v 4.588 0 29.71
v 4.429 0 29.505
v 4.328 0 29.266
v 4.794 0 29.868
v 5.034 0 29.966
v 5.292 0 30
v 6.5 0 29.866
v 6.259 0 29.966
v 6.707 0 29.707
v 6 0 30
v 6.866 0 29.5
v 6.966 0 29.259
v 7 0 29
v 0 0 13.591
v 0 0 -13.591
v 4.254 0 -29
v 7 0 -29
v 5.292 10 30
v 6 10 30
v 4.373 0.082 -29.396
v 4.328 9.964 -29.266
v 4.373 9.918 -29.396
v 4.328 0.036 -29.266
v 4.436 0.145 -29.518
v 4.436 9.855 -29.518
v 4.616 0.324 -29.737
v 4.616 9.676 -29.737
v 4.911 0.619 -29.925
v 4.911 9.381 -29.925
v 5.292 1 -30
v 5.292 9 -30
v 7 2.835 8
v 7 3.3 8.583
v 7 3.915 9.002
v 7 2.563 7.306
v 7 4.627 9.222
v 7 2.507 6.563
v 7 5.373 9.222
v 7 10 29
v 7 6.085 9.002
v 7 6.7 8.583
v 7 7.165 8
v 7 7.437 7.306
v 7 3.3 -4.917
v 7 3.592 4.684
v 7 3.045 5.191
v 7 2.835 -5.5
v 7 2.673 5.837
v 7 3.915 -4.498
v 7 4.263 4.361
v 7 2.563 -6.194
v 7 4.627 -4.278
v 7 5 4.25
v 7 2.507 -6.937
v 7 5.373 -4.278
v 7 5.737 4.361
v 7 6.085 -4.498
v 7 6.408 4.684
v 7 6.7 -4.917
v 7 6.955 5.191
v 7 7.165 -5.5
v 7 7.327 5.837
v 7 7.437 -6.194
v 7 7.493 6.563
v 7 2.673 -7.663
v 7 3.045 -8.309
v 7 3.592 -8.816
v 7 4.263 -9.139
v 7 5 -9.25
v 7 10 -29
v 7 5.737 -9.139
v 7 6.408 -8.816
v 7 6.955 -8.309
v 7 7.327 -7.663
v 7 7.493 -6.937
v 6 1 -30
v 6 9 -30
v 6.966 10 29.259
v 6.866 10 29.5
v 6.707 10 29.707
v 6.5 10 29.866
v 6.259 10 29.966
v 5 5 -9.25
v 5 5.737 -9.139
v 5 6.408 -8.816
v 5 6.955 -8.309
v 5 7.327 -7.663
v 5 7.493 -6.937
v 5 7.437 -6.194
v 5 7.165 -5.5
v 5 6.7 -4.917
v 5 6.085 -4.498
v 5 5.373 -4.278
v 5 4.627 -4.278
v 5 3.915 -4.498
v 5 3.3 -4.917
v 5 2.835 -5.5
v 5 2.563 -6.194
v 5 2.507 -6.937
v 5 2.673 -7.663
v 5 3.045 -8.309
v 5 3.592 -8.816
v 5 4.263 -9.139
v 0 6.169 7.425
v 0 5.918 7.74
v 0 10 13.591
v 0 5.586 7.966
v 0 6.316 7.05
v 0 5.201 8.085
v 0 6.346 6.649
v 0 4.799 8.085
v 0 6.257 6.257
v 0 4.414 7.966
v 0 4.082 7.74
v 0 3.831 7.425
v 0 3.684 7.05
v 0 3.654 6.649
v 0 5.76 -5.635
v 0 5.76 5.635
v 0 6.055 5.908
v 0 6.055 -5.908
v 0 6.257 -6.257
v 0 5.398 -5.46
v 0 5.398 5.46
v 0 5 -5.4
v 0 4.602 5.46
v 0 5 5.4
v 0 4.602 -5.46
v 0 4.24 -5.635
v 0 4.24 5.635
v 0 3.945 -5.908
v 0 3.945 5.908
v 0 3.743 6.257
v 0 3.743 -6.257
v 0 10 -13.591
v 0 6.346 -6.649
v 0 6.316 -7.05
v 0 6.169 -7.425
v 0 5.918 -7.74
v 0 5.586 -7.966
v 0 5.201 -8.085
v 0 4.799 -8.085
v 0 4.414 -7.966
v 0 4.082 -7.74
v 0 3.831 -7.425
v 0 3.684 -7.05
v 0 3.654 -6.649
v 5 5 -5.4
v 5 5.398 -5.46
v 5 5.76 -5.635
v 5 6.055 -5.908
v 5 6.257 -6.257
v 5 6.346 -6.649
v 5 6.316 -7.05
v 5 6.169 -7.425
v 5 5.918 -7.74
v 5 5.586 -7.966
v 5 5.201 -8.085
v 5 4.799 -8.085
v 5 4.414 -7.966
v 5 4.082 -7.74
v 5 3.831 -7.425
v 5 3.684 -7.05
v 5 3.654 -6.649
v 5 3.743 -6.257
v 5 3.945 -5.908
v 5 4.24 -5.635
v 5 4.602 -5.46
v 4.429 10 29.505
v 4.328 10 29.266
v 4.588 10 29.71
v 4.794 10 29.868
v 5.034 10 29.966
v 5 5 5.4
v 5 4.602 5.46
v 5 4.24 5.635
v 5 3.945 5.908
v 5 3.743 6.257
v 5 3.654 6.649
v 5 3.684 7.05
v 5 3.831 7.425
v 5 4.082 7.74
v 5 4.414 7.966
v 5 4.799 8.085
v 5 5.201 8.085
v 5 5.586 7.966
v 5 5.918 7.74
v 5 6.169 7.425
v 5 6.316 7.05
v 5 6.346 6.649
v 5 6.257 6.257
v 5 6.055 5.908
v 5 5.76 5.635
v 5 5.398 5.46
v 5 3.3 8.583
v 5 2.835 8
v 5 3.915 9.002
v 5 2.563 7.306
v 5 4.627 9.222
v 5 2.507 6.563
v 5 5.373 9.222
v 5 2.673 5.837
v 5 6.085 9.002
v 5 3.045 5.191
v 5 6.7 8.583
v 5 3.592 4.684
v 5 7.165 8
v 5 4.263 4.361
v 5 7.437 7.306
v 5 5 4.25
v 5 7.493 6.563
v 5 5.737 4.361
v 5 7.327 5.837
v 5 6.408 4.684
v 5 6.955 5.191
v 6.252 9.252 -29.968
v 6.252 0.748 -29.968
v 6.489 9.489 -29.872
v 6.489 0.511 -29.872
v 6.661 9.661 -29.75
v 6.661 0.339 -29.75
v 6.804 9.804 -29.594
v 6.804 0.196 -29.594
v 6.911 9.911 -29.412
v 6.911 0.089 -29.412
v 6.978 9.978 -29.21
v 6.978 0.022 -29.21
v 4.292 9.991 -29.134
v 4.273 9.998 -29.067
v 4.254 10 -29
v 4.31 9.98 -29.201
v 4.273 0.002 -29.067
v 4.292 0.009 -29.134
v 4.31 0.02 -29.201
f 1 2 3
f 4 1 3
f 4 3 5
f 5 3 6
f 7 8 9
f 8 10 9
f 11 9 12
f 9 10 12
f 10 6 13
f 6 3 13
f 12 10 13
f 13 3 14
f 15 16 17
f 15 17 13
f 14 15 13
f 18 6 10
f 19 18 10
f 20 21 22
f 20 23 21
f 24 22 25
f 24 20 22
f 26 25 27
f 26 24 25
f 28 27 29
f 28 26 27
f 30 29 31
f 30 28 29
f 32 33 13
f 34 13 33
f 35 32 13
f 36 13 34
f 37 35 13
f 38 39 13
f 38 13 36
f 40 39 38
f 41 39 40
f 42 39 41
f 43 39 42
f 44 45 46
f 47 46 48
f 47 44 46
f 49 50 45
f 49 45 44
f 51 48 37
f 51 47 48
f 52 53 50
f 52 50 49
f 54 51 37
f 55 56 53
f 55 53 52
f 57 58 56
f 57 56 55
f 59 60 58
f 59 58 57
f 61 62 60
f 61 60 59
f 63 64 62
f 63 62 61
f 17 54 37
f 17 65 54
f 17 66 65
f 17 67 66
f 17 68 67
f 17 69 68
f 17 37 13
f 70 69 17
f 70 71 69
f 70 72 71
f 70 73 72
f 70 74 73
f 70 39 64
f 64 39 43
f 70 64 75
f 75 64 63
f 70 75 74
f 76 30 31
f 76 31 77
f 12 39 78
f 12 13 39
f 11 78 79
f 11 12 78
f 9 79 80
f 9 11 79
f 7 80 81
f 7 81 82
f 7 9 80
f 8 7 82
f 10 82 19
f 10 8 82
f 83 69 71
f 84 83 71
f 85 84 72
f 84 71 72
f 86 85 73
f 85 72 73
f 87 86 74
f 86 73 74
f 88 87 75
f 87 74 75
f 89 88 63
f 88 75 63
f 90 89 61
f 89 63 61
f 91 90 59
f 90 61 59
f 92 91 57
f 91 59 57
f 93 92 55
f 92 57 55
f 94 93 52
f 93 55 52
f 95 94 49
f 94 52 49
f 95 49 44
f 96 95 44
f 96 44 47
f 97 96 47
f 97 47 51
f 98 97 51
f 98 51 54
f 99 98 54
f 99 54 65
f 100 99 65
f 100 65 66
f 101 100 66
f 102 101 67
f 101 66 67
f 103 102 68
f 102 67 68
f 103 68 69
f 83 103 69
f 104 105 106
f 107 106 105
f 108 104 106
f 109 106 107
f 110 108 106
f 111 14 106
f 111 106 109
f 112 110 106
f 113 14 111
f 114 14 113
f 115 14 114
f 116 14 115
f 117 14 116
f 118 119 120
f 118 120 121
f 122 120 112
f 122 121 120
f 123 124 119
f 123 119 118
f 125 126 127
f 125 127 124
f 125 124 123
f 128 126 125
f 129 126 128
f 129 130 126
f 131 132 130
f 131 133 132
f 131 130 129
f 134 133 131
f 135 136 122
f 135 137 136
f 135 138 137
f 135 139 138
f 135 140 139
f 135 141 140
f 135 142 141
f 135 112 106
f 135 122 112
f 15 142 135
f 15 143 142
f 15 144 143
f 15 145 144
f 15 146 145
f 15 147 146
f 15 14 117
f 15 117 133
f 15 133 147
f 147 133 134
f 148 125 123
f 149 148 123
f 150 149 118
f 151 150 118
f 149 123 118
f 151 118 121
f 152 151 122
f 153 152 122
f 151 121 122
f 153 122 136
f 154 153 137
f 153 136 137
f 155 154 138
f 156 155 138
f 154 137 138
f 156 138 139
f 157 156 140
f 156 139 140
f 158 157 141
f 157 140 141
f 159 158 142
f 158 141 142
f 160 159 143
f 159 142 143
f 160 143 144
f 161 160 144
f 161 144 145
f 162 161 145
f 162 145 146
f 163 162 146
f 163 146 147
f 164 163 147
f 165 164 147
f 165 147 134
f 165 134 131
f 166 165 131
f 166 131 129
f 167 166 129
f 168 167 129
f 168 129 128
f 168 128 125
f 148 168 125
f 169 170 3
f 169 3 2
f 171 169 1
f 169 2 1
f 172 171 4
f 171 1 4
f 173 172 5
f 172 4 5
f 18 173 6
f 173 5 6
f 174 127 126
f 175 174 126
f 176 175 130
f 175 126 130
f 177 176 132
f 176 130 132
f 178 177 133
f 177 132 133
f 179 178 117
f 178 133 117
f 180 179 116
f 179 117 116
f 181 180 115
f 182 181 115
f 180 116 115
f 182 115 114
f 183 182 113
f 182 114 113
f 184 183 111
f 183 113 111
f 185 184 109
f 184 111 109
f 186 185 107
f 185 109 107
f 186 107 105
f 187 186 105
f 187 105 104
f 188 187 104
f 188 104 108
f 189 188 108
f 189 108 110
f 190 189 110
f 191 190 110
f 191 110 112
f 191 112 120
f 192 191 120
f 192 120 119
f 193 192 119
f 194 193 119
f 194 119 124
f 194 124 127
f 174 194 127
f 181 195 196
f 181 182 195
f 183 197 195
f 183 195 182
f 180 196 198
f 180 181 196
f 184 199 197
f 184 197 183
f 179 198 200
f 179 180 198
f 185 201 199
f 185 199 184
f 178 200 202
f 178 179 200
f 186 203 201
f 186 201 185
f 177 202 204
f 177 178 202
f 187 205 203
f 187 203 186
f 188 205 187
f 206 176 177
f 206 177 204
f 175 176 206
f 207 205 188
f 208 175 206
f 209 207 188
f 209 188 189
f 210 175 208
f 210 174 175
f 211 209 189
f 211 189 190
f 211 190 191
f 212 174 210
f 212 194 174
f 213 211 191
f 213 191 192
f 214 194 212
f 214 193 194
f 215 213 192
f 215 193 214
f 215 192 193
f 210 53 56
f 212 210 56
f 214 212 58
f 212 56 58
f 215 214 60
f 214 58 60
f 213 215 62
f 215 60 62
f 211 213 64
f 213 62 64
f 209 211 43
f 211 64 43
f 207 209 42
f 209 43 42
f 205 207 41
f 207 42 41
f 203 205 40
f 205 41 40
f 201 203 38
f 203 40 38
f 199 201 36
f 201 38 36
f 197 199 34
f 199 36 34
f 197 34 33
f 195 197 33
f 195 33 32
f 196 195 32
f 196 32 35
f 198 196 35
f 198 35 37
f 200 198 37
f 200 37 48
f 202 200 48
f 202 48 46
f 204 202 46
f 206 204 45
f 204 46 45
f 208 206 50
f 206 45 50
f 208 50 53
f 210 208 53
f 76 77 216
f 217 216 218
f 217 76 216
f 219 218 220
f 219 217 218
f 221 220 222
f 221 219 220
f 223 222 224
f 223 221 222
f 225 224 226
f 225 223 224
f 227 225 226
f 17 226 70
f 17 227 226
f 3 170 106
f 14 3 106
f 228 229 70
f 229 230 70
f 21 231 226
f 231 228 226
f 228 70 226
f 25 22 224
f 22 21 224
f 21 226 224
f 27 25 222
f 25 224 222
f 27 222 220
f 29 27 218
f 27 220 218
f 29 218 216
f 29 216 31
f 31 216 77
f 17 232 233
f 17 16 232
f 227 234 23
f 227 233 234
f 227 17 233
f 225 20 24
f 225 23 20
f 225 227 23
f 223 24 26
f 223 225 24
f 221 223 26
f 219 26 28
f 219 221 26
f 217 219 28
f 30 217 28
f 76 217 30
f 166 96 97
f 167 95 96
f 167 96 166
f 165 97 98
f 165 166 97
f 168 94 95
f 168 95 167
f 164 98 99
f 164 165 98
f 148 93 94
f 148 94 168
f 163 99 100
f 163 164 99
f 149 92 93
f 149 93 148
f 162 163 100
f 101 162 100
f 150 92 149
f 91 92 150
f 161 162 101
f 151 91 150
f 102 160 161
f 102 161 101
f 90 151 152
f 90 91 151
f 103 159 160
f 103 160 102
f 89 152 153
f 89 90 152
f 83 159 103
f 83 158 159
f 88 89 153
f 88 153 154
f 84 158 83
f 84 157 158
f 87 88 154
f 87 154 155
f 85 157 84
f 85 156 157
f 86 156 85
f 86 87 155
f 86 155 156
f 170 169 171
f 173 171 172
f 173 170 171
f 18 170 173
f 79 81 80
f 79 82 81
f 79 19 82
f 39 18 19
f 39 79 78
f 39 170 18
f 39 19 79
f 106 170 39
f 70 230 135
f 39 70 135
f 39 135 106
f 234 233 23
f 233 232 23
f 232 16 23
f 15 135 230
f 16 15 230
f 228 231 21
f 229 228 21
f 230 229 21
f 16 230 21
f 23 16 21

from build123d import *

# Parameters (mm, degrees)
SKETCH1_W           = 33.537053001
SKETCH1_H           = 60
BOSS_EXTRUDE1_DEPTH = 10
SKETCH2_R           = 1.35
CUT_EXTRUDE1_DEPTH  = 10
CUT_EXTRUDE3_DEPTH  = 18
SKETCH10_W          = 20.892081227
SKETCH10_H          = 64.192604416
CUT_EXTRUDE4_DEPTH  = 26
SKETCH15_W          = 6.200817496
SKETCH15_H          = 60
CUT_EXTRUDE5_DEPTH  = 26
FILLET1_R           = 1
SKETCH16_R          = 2.5
CUT_EXTRUDE6_DEPTH  = 2


with BuildPart() as part:
    # Sketch1 → Boss-Extrude1 (new body)
    with BuildSketch(Plane(origin=(0, 0, 0), x_dir=(1, 0, 0), z_dir=(0, 1, 0))):
        with Locations((16.768526501, 0)):
            Rectangle(SKETCH1_W, SKETCH1_H)
    extrude(amount=BOSS_EXTRUDE1_DEPTH)

    # Sketch2 → Cut-Extrude1 (cut)
    with BuildSketch(Plane.ZY):
        with Locations((-6.75, 5)):
            Circle(SKETCH2_R)
        with Locations(Location((6.75, 5, 0), (0, 0, 180))):
            Circle(SKETCH2_R)
    extrude(amount=-CUT_EXTRUDE1_DEPTH, mode=Mode.SUBTRACT)

    # Sketch5 → Cut-Extrude3 (cut)
    with BuildSketch(Plane(origin=(0, 10, 0), x_dir=(1, 0, 0), z_dir=(0, 1, 0))):
        Polygon((0, 13.591085099), (4.530530491, 30), (0, 30), align=None)
        Polygon((0, -30), (4.530530491, -30), (0, -13.591085099), align=None)
    extrude(amount=-CUT_EXTRUDE3_DEPTH, mode=Mode.SUBTRACT)

    # Sketch10 → Cut-Extrude4 (cut)
    with BuildSketch(Plane(origin=(0, 10, 0), x_dir=(1, 0, 0), z_dir=(0, 1, 0))):
        with Locations((23.64685811, -0.926664893)):
            Rectangle(SKETCH10_W, SKETCH10_H)
    extrude(amount=-CUT_EXTRUDE4_DEPTH, mode=Mode.SUBTRACT)

    # Sketch15 → Cut-Extrude5 (cut)
    with BuildSketch(Plane(origin=(0, 10, 0), x_dir=(1, 0, 0), z_dir=(0, 1, 0))):
        with Locations((10.100408748, 0)):
            Rectangle(SKETCH15_W, SKETCH15_H)
    extrude(amount=-CUT_EXTRUDE5_DEPTH, mode=Mode.SUBTRACT)

    # Fillet1
    fillet1_edges = [part.edges().sort_by_distance(p)[0] for p in [
        (5.765265246, 0, -30),
        (5.765265246, 10, -30),
        (4.530530491, 5, -30),
        (4.530530491, 5, 30),
        (7, 5, 30),
        (7, 5, -30),
    ]]
    fillet(fillet1_edges, radius=FILLET1_R)

    # Sketch16 → Cut-Extrude6 (cut)
    with BuildSketch(Plane(origin=(7, 0, 0), x_dir=(0, 0, -1), z_dir=(1, 0, 0))):
        with Locations((-6.75, 5)):
            Circle(SKETCH16_R)
        with Locations((6.75, 5)):
            Circle(SKETCH16_R)
    extrude(amount=-CUT_EXTRUDE6_DEPTH, mode=Mode.SUBTRACT)


solid = part.part
